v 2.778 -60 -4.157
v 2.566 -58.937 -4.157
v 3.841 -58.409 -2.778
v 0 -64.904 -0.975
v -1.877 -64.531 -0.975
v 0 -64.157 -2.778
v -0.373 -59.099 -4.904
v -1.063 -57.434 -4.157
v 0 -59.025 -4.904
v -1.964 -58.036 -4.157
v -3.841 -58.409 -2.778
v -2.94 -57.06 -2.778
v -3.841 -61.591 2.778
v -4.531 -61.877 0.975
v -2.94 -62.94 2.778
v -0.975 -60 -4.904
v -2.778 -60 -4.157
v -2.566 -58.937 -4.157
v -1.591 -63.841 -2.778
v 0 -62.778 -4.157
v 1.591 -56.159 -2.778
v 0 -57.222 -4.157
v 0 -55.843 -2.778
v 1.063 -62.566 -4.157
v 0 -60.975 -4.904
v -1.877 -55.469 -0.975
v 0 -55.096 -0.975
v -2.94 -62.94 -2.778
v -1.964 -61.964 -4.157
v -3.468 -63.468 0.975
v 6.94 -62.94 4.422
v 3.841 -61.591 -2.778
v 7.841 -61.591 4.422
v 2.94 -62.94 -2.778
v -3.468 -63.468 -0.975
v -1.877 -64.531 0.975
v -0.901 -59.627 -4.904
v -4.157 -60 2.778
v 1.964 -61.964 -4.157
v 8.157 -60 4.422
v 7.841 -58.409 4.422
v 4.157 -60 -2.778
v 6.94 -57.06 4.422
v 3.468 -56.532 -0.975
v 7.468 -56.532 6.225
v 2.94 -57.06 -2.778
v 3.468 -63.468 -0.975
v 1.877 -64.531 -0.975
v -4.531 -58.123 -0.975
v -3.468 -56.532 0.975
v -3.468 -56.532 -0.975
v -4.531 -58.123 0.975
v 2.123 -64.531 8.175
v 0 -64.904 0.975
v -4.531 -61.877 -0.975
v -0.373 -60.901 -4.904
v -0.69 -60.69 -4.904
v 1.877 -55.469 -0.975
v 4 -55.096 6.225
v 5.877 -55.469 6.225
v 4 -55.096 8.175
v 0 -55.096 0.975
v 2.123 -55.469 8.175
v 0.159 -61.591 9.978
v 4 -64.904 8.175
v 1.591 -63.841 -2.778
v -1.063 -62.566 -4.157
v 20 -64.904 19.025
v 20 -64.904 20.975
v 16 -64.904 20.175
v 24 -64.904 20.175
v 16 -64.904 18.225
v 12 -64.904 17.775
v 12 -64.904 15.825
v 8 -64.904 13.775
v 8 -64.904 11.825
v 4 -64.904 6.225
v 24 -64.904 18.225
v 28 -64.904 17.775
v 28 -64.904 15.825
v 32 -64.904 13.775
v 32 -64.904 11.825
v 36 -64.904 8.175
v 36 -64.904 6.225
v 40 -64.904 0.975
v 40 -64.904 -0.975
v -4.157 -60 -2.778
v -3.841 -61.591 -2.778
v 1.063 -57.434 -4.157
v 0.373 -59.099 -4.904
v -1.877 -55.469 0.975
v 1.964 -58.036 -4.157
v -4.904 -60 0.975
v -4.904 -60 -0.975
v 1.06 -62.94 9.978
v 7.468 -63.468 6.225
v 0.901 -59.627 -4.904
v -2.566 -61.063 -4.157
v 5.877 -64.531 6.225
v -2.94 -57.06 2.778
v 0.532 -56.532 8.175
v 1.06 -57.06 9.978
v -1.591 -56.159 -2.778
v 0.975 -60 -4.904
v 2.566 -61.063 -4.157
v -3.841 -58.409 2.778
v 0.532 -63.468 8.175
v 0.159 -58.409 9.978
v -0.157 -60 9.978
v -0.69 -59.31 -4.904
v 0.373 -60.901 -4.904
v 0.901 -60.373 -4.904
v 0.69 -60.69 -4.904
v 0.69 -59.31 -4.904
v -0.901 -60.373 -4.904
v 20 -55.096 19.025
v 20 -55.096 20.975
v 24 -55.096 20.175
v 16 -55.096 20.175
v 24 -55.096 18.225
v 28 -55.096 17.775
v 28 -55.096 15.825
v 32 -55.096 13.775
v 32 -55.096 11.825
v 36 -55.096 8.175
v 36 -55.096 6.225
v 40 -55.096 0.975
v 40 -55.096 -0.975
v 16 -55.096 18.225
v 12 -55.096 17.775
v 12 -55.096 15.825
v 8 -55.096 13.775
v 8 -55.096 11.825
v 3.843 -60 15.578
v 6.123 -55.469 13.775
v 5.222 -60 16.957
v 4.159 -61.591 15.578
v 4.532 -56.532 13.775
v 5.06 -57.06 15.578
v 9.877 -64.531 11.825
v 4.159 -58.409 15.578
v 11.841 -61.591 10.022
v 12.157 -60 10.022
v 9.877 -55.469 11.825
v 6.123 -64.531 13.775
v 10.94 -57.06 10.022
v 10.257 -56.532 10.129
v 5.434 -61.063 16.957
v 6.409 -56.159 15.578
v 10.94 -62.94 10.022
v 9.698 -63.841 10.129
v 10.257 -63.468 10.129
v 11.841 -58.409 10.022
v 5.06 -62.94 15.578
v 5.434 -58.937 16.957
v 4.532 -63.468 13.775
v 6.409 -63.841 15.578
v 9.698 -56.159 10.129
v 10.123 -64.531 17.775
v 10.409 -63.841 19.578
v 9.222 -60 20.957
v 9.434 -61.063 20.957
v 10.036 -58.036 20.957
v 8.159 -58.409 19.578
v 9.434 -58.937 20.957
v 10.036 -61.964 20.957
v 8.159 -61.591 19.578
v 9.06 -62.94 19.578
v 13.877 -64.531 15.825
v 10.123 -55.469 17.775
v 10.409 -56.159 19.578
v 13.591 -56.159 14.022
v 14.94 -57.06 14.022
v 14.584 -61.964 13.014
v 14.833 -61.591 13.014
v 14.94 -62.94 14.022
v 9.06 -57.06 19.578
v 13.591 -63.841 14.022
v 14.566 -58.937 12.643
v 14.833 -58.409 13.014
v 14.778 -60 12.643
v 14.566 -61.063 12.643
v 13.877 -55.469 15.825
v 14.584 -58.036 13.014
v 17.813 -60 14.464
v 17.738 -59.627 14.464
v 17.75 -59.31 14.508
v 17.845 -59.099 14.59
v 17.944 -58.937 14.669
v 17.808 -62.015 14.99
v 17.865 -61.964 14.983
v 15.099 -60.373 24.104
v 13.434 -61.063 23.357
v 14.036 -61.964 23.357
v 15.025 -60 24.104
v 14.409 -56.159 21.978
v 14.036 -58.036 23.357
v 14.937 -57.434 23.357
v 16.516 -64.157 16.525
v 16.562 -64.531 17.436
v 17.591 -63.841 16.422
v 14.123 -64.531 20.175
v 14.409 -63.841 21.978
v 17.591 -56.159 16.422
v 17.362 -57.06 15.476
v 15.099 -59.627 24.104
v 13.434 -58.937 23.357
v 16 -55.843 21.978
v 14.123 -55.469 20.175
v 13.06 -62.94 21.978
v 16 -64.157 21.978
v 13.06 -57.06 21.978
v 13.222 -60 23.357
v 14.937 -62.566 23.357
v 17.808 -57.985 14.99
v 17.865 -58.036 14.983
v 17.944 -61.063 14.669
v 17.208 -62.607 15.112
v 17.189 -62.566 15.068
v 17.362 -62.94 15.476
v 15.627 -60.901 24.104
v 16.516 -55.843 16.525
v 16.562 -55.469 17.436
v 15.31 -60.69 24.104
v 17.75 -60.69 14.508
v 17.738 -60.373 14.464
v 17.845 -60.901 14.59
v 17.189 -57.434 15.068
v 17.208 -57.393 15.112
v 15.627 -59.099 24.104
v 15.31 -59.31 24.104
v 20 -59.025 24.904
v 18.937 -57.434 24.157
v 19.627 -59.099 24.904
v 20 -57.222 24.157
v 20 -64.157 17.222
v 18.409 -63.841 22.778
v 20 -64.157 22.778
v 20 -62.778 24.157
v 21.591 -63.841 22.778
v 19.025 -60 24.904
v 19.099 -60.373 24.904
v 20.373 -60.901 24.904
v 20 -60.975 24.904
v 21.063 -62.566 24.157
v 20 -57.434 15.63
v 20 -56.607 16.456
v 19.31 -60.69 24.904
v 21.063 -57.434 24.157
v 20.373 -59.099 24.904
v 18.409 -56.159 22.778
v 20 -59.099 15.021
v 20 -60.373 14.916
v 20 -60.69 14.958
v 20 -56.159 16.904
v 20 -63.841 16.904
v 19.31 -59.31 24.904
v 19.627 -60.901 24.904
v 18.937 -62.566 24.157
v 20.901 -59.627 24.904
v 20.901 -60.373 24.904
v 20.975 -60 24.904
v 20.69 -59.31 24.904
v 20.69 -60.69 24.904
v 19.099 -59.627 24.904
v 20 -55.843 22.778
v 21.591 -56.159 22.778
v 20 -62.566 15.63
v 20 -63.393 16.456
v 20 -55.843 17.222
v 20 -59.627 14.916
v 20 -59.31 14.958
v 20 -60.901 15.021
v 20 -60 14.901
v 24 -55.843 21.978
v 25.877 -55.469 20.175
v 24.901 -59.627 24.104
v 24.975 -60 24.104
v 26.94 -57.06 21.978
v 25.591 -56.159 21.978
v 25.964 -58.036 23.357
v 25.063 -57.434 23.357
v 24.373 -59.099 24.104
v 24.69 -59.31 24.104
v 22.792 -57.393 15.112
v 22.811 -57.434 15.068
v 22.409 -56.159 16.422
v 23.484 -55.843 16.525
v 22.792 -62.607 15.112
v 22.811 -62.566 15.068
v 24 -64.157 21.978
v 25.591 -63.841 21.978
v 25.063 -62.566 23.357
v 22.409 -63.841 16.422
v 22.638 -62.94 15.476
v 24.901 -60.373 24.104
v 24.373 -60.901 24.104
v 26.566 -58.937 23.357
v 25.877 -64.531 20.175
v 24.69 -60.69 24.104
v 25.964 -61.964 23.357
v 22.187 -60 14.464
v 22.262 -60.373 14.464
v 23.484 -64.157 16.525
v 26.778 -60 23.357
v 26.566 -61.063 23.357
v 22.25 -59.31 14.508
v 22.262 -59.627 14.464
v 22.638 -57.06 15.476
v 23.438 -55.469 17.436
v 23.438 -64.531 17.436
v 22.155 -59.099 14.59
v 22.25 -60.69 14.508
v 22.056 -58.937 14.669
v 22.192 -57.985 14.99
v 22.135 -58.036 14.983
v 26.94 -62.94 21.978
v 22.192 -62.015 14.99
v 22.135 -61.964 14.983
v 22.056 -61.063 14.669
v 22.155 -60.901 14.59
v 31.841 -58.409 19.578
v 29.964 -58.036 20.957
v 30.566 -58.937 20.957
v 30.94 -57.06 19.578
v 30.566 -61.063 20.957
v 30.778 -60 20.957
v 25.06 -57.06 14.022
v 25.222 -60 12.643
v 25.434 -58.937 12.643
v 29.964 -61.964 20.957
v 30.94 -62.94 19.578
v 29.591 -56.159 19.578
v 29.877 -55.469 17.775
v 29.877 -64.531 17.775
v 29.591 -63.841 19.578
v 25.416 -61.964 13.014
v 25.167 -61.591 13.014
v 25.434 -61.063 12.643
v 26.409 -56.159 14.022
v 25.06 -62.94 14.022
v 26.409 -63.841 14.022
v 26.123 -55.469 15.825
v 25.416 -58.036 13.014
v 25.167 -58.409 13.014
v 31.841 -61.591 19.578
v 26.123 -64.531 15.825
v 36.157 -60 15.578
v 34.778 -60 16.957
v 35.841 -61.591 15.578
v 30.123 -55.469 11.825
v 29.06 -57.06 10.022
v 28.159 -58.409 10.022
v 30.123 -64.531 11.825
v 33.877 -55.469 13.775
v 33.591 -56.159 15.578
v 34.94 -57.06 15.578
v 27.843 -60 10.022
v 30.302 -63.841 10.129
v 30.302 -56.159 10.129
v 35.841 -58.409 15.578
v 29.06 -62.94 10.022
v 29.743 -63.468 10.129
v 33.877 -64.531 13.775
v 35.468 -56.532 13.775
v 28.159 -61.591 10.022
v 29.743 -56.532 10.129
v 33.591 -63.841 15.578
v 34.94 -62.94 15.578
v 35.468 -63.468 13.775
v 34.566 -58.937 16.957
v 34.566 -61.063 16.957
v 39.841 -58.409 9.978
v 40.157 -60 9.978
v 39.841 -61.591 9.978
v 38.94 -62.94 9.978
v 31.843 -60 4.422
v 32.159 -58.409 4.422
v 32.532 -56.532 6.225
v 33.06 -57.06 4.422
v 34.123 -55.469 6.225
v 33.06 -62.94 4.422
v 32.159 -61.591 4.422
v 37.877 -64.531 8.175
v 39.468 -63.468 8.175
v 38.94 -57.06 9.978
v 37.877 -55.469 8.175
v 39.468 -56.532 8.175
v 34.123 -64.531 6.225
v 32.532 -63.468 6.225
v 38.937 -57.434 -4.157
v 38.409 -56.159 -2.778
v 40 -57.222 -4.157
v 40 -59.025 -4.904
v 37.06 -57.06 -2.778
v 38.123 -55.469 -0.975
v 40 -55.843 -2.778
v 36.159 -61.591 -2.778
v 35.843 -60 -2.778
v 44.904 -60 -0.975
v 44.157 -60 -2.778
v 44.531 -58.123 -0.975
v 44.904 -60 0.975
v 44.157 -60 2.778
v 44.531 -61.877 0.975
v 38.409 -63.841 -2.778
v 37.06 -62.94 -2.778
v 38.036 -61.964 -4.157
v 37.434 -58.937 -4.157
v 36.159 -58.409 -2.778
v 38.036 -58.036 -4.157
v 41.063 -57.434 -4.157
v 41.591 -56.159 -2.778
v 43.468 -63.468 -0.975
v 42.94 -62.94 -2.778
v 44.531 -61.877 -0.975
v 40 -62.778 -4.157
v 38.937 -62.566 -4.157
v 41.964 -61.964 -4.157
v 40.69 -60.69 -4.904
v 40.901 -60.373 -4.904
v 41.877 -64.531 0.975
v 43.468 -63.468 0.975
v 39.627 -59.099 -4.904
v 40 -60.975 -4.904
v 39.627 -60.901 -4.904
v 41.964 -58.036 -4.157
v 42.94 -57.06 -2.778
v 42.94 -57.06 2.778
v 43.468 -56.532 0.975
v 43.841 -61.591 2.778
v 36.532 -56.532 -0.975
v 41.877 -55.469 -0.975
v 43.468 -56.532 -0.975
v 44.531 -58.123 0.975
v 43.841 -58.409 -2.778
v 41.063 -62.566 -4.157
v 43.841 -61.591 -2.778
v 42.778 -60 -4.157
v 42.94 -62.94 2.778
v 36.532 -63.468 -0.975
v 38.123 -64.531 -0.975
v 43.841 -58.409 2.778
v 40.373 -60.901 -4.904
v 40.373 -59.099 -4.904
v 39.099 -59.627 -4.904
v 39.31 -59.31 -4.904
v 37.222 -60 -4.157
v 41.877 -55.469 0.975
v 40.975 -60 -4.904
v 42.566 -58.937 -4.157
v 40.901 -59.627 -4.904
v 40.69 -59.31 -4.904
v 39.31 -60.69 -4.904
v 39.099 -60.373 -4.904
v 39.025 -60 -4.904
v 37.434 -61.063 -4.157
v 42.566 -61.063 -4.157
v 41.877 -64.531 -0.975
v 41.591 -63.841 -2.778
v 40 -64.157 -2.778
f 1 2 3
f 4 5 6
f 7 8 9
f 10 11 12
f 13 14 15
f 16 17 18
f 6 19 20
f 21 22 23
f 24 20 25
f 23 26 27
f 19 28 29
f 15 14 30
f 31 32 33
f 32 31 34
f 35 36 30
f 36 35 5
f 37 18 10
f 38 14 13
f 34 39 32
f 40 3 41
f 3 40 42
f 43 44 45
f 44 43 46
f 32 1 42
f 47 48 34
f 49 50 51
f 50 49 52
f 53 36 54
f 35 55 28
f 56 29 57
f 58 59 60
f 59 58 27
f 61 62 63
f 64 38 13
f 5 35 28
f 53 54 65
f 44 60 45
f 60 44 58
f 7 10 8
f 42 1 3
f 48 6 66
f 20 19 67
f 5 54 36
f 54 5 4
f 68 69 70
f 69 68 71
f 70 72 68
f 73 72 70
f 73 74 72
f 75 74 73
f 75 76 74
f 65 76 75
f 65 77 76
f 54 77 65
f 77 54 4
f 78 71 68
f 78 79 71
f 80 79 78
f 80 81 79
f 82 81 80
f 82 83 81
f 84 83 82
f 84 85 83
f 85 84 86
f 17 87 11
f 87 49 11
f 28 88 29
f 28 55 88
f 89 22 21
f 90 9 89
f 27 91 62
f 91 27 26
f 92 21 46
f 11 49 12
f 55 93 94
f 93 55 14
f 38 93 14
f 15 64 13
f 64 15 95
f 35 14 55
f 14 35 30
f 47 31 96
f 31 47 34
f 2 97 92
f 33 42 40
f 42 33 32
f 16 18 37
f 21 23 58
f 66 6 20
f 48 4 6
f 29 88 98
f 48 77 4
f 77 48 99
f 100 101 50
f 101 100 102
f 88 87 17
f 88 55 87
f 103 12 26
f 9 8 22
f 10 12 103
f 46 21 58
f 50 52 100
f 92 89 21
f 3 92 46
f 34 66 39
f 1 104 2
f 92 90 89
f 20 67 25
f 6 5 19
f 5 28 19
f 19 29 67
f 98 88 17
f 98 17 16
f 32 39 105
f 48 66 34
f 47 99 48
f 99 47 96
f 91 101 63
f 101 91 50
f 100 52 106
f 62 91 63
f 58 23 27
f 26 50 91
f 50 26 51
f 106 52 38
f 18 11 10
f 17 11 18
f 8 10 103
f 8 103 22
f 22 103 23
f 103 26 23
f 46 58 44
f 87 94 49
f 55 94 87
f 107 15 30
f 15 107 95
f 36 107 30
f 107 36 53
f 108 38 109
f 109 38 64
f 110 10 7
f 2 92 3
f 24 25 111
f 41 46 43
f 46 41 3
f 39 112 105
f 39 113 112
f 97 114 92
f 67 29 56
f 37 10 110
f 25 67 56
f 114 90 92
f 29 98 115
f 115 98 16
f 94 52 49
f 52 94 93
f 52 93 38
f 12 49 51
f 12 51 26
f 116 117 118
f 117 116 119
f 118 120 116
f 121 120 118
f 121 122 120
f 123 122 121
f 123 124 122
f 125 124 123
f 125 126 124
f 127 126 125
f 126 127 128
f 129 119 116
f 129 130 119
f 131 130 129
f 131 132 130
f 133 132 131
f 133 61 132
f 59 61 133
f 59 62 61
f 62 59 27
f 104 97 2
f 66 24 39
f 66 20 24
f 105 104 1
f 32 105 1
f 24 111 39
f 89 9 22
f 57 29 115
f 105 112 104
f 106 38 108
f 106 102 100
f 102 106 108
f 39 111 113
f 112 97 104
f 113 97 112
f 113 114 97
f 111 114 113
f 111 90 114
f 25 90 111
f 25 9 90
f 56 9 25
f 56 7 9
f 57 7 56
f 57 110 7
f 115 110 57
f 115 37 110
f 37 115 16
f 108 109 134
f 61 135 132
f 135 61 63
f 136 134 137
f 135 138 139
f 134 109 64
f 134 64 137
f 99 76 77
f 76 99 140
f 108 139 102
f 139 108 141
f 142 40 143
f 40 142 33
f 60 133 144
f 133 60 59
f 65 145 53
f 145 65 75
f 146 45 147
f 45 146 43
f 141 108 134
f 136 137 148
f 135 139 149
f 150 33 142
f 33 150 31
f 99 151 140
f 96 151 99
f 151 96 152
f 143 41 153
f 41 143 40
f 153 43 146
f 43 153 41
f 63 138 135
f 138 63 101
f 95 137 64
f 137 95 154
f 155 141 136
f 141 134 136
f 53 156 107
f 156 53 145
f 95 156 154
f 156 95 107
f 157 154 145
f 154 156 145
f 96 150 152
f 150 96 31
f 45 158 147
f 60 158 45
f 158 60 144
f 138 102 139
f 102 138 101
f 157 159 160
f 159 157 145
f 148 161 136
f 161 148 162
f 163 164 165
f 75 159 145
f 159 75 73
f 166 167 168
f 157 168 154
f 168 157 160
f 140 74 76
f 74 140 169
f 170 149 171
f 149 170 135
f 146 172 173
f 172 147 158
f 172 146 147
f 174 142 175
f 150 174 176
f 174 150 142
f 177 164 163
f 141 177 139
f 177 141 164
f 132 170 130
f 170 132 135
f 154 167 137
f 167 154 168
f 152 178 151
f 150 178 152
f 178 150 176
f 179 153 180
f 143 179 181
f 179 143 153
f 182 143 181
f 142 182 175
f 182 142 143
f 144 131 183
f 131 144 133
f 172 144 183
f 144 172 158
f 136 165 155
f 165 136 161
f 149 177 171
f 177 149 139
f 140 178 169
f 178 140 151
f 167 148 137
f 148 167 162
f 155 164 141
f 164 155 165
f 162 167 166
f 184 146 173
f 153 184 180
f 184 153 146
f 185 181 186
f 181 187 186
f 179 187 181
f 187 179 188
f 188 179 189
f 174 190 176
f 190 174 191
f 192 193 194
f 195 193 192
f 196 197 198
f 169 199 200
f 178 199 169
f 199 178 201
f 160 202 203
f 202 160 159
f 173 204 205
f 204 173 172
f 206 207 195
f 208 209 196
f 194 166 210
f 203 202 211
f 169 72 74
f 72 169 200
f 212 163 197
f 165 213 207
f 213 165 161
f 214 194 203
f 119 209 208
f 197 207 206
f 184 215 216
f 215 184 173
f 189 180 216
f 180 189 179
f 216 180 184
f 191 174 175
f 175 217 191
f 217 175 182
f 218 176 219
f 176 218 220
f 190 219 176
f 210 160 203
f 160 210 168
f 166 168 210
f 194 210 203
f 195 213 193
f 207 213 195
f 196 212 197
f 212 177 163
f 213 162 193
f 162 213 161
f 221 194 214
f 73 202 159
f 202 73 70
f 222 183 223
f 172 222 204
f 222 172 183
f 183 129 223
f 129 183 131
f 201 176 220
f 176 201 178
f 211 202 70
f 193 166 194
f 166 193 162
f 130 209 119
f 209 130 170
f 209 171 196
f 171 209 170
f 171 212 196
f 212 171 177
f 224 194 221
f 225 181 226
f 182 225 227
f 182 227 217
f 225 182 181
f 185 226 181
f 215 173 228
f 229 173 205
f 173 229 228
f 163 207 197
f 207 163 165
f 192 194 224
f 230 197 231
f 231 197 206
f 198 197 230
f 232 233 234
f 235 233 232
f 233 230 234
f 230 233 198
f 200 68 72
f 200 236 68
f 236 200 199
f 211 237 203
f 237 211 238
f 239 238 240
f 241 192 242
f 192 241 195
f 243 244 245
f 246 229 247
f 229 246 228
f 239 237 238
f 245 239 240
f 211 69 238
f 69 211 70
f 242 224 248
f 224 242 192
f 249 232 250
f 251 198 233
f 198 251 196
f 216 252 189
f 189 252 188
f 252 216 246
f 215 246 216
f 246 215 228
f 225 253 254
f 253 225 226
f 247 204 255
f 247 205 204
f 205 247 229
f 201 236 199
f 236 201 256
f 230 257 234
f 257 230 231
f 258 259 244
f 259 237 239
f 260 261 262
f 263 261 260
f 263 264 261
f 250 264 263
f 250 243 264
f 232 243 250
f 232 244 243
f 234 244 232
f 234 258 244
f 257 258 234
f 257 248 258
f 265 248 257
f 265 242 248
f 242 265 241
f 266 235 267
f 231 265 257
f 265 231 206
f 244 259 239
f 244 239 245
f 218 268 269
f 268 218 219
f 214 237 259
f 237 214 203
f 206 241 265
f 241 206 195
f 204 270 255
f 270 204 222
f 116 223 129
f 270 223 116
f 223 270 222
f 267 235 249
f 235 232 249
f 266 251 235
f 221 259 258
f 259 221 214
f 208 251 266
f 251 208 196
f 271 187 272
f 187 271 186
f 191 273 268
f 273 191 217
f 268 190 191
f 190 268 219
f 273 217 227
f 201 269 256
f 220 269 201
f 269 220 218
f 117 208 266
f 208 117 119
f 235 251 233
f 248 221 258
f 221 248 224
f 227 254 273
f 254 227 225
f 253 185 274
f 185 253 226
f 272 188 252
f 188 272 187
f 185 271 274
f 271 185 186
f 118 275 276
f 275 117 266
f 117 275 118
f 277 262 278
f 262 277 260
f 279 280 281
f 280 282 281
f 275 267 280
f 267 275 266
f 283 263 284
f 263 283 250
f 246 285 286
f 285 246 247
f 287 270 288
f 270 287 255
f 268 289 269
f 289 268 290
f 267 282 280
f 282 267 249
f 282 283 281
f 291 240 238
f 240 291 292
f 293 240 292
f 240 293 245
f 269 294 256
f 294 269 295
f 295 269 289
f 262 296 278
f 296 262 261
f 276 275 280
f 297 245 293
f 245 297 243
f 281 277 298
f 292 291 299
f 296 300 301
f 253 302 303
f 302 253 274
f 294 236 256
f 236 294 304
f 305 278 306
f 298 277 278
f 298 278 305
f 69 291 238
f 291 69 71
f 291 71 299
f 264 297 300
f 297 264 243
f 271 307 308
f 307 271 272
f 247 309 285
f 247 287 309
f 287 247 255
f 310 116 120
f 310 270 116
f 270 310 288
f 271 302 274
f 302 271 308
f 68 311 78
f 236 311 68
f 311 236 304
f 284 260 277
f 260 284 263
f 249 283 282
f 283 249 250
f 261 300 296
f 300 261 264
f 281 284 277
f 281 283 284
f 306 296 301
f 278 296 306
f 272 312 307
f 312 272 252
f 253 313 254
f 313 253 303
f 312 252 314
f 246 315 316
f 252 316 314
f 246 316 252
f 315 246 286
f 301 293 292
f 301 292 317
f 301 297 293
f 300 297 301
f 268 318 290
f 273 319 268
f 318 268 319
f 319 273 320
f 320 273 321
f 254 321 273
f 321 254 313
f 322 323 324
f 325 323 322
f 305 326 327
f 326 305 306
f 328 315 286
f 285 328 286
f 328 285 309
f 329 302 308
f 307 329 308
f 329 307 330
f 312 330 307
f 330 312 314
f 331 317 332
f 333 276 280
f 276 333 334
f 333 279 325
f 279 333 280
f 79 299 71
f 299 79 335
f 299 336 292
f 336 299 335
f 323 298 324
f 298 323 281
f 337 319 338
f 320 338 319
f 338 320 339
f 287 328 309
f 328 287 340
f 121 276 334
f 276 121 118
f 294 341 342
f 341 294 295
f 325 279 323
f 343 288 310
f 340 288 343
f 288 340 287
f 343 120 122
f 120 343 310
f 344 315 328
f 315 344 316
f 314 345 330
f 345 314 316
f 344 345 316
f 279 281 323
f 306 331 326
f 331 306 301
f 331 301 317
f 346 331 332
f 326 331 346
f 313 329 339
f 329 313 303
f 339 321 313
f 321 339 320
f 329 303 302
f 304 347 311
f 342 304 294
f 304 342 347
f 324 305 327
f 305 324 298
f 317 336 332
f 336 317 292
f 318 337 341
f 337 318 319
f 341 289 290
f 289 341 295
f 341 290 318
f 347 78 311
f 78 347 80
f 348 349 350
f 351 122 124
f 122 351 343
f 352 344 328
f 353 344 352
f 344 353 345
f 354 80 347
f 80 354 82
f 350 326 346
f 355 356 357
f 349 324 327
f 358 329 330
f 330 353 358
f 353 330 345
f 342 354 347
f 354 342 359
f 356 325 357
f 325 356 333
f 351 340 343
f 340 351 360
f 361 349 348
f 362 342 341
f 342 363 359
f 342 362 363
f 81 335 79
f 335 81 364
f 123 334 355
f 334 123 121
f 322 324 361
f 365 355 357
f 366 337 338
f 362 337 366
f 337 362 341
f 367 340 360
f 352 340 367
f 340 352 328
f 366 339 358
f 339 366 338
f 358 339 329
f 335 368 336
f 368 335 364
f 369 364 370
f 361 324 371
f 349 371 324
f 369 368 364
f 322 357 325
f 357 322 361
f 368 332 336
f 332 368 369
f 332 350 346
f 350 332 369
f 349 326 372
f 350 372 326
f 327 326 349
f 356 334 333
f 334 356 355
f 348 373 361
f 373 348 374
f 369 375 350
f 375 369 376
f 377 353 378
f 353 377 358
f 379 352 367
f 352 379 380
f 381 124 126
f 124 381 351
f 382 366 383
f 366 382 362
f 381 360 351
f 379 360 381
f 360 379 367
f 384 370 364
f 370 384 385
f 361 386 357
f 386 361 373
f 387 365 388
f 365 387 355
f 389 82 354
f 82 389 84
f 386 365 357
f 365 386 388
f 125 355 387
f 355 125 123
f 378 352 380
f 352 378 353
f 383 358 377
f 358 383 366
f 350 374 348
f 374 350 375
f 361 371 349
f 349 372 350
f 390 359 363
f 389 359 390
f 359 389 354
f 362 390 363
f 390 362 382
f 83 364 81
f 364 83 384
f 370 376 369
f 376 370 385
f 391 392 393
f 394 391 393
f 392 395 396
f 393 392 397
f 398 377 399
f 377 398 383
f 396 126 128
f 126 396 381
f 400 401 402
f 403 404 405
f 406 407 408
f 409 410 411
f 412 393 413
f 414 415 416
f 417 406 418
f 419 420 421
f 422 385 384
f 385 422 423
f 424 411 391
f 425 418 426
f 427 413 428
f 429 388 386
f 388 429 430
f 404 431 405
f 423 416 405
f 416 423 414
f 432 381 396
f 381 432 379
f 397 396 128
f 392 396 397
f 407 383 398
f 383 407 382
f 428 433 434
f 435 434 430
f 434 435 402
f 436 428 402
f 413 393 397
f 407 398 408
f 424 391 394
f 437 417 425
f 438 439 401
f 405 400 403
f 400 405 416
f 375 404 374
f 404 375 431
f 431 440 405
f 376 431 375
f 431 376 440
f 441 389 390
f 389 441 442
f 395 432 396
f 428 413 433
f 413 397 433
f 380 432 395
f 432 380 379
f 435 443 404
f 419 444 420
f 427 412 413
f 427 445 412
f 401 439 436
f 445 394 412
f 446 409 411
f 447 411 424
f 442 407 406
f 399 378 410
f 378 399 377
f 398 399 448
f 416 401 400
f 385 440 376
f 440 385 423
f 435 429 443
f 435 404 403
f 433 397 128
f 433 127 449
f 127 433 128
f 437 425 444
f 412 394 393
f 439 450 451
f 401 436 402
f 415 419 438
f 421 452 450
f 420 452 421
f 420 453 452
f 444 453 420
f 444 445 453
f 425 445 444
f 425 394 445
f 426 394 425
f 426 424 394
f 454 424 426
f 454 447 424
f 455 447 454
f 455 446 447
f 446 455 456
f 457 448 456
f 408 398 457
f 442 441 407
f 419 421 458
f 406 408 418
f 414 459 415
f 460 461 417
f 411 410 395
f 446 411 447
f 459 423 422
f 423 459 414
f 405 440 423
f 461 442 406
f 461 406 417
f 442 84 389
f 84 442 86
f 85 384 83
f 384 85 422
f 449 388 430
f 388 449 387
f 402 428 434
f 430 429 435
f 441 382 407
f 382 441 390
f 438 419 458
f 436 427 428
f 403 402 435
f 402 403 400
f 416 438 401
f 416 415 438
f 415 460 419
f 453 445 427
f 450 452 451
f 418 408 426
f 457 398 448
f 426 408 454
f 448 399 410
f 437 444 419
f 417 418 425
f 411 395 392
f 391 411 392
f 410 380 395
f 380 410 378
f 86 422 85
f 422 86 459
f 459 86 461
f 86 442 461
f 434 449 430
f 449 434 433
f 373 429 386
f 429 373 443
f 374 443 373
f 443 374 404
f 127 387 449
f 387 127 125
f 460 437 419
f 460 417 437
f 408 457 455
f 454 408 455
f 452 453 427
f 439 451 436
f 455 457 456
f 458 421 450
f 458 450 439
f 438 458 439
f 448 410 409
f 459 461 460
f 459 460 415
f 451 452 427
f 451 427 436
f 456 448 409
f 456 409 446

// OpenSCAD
/*
 * OpenSCAD 贝塞尔曲线演示
 * 绘制一条二次贝塞尔曲线并生成3D模型
 */

// 定义贝塞尔曲线的控制点
// 格式: [x, y]
p0 = [0, 0];    // 起点
p1 = [20, 40];  // 控制点
p2 = [40, 0];   // 终点

// 贝塞尔曲线函数（二次）
// t: 参数，范围[0, 1]
function bezier2(t, p0, p1, p2) = 
    (1-t)*(1-t)*p0 + 2*(1-t)*t*p1 + t*t*p2;

// 创建点列表用于多边形
points = [for (t = [0:0.05:1]) bezier2(t, p0, p1, p2)];

// 方法1：绘制2D贝塞尔曲线
module drawBezierCurve2D() {
    echo("绘制2D贝塞尔曲线");
    
    // 绘制控制多边形
    color("red") {
        translate([p0[0], p0[1], 0]) circle(r=2);
        translate([p1[0], p1[1], 0]) circle(r=2);
        translate([p2[0], p2[1], 0]) circle(r=2);
    }
    
    // 绘制控制线
    color("gray", 0.3) {
        polygon([p0, p1, p2]);
    }
    
    // 绘制贝塞尔曲线
    color("blue") {
        polygon(points);
    }
}

// 方法2：创建3D挤出模型
module create3DModel() {
    echo("创建3D挤出模型");
    
    // 原始2D形状
    linear_extrude(height = 10) {
        polygon(points);
    }
}

// 方法3：创建旋转体
module createRevolvedModel() {
    echo("创建旋转体");
    
    rotate_extrude(angle = 360) {
        translate([50, 0, 0]) {
            polygon(points);
        }
    }
}

// 方法4：使用贝塞尔曲线作为扫描路径
module createSweptModel() {
    echo("创建扫描模型");
    
    // 定义扫描路径（贝塞尔曲线）
    path_points = [for (t = [0:0.1:1]) 
        [bezier2(t, p0, p1, p2)[0], 0, bezier2(t, p0, p1, p2)[1]]
    ];
    
    // 沿着路径扫描一个圆形
    for (i = [0:len(path_points)-2]) {
        hull() {
            translate(path_points[i]) sphere(r=5);
            translate(path_points[i+1]) sphere(r=5);
        }
    }
}

// 方法5：更复杂的贝塞尔曲面（通过放样）
module createLoftedSurface() {
    echo("创建放样曲面");
    
    // 定义多条贝塞尔曲线
    curve1 = [for (t = [0:0.1:1]) 
        [bezier2(t, p0, p1, p2)[0], 0, bezier2(t, p0, p1, p2)[1]]
    ];
    
    curve2 = [for (t = [0:0.1:1]) 
        [bezier2(t, p0, p1, p2)[0] + 10, 20, bezier2(t, p0, p1, p2)[1] + 10]
    ];
    
    curve3 = [for (t = [0:0.1:1]) 
        [bezier2(t, p0, p1, p2)[0] + 20, 40, bezier2(t, p0, p1, p2)[1] + 20]
    ];
    
    // 创建连接曲面的多边形
    polyhedron(
        points = concat(curve1, curve2, curve3),
        faces = [
            // 连接curve1和curve2
            for (i = [0:len(curve1)-2])
                [i, i+1, len(curve1)+i+1, len(curve1)+i],
            // 连接curve2和curve3
            for (i = [0:len(curve2)-2])
                [len(curve1)+i, len(curve1)+i+1, len(curve1)+len(curve2)+i+1, len(curve1)+len(curve2)+i]
        ],
        convexity = 10
    );
}

// 主程序 - 选择要显示的模型
echo("=== OpenSCAD 贝塞尔曲线演示 ===");
echo("控制点: P0", p0, "P1", p1, "P2", p2);

// 取消注释你想要查看的模型：

// // 1. 显示2D贝塞尔曲线（基础演示）
// drawBezierCurve2D();

// 2. 显示3D挤出模型
// translate([0, 60, 0]) create3DModel();

// 3. 显示旋转体
// translate([100, 0, 0]) createRevolvedModel();

// 4. 显示扫描模型
translate([0, -60, 0]) createSweptModel();

// 5. 显示放样曲面
// translate([-100, 0, 0]) createLoftedModel();
